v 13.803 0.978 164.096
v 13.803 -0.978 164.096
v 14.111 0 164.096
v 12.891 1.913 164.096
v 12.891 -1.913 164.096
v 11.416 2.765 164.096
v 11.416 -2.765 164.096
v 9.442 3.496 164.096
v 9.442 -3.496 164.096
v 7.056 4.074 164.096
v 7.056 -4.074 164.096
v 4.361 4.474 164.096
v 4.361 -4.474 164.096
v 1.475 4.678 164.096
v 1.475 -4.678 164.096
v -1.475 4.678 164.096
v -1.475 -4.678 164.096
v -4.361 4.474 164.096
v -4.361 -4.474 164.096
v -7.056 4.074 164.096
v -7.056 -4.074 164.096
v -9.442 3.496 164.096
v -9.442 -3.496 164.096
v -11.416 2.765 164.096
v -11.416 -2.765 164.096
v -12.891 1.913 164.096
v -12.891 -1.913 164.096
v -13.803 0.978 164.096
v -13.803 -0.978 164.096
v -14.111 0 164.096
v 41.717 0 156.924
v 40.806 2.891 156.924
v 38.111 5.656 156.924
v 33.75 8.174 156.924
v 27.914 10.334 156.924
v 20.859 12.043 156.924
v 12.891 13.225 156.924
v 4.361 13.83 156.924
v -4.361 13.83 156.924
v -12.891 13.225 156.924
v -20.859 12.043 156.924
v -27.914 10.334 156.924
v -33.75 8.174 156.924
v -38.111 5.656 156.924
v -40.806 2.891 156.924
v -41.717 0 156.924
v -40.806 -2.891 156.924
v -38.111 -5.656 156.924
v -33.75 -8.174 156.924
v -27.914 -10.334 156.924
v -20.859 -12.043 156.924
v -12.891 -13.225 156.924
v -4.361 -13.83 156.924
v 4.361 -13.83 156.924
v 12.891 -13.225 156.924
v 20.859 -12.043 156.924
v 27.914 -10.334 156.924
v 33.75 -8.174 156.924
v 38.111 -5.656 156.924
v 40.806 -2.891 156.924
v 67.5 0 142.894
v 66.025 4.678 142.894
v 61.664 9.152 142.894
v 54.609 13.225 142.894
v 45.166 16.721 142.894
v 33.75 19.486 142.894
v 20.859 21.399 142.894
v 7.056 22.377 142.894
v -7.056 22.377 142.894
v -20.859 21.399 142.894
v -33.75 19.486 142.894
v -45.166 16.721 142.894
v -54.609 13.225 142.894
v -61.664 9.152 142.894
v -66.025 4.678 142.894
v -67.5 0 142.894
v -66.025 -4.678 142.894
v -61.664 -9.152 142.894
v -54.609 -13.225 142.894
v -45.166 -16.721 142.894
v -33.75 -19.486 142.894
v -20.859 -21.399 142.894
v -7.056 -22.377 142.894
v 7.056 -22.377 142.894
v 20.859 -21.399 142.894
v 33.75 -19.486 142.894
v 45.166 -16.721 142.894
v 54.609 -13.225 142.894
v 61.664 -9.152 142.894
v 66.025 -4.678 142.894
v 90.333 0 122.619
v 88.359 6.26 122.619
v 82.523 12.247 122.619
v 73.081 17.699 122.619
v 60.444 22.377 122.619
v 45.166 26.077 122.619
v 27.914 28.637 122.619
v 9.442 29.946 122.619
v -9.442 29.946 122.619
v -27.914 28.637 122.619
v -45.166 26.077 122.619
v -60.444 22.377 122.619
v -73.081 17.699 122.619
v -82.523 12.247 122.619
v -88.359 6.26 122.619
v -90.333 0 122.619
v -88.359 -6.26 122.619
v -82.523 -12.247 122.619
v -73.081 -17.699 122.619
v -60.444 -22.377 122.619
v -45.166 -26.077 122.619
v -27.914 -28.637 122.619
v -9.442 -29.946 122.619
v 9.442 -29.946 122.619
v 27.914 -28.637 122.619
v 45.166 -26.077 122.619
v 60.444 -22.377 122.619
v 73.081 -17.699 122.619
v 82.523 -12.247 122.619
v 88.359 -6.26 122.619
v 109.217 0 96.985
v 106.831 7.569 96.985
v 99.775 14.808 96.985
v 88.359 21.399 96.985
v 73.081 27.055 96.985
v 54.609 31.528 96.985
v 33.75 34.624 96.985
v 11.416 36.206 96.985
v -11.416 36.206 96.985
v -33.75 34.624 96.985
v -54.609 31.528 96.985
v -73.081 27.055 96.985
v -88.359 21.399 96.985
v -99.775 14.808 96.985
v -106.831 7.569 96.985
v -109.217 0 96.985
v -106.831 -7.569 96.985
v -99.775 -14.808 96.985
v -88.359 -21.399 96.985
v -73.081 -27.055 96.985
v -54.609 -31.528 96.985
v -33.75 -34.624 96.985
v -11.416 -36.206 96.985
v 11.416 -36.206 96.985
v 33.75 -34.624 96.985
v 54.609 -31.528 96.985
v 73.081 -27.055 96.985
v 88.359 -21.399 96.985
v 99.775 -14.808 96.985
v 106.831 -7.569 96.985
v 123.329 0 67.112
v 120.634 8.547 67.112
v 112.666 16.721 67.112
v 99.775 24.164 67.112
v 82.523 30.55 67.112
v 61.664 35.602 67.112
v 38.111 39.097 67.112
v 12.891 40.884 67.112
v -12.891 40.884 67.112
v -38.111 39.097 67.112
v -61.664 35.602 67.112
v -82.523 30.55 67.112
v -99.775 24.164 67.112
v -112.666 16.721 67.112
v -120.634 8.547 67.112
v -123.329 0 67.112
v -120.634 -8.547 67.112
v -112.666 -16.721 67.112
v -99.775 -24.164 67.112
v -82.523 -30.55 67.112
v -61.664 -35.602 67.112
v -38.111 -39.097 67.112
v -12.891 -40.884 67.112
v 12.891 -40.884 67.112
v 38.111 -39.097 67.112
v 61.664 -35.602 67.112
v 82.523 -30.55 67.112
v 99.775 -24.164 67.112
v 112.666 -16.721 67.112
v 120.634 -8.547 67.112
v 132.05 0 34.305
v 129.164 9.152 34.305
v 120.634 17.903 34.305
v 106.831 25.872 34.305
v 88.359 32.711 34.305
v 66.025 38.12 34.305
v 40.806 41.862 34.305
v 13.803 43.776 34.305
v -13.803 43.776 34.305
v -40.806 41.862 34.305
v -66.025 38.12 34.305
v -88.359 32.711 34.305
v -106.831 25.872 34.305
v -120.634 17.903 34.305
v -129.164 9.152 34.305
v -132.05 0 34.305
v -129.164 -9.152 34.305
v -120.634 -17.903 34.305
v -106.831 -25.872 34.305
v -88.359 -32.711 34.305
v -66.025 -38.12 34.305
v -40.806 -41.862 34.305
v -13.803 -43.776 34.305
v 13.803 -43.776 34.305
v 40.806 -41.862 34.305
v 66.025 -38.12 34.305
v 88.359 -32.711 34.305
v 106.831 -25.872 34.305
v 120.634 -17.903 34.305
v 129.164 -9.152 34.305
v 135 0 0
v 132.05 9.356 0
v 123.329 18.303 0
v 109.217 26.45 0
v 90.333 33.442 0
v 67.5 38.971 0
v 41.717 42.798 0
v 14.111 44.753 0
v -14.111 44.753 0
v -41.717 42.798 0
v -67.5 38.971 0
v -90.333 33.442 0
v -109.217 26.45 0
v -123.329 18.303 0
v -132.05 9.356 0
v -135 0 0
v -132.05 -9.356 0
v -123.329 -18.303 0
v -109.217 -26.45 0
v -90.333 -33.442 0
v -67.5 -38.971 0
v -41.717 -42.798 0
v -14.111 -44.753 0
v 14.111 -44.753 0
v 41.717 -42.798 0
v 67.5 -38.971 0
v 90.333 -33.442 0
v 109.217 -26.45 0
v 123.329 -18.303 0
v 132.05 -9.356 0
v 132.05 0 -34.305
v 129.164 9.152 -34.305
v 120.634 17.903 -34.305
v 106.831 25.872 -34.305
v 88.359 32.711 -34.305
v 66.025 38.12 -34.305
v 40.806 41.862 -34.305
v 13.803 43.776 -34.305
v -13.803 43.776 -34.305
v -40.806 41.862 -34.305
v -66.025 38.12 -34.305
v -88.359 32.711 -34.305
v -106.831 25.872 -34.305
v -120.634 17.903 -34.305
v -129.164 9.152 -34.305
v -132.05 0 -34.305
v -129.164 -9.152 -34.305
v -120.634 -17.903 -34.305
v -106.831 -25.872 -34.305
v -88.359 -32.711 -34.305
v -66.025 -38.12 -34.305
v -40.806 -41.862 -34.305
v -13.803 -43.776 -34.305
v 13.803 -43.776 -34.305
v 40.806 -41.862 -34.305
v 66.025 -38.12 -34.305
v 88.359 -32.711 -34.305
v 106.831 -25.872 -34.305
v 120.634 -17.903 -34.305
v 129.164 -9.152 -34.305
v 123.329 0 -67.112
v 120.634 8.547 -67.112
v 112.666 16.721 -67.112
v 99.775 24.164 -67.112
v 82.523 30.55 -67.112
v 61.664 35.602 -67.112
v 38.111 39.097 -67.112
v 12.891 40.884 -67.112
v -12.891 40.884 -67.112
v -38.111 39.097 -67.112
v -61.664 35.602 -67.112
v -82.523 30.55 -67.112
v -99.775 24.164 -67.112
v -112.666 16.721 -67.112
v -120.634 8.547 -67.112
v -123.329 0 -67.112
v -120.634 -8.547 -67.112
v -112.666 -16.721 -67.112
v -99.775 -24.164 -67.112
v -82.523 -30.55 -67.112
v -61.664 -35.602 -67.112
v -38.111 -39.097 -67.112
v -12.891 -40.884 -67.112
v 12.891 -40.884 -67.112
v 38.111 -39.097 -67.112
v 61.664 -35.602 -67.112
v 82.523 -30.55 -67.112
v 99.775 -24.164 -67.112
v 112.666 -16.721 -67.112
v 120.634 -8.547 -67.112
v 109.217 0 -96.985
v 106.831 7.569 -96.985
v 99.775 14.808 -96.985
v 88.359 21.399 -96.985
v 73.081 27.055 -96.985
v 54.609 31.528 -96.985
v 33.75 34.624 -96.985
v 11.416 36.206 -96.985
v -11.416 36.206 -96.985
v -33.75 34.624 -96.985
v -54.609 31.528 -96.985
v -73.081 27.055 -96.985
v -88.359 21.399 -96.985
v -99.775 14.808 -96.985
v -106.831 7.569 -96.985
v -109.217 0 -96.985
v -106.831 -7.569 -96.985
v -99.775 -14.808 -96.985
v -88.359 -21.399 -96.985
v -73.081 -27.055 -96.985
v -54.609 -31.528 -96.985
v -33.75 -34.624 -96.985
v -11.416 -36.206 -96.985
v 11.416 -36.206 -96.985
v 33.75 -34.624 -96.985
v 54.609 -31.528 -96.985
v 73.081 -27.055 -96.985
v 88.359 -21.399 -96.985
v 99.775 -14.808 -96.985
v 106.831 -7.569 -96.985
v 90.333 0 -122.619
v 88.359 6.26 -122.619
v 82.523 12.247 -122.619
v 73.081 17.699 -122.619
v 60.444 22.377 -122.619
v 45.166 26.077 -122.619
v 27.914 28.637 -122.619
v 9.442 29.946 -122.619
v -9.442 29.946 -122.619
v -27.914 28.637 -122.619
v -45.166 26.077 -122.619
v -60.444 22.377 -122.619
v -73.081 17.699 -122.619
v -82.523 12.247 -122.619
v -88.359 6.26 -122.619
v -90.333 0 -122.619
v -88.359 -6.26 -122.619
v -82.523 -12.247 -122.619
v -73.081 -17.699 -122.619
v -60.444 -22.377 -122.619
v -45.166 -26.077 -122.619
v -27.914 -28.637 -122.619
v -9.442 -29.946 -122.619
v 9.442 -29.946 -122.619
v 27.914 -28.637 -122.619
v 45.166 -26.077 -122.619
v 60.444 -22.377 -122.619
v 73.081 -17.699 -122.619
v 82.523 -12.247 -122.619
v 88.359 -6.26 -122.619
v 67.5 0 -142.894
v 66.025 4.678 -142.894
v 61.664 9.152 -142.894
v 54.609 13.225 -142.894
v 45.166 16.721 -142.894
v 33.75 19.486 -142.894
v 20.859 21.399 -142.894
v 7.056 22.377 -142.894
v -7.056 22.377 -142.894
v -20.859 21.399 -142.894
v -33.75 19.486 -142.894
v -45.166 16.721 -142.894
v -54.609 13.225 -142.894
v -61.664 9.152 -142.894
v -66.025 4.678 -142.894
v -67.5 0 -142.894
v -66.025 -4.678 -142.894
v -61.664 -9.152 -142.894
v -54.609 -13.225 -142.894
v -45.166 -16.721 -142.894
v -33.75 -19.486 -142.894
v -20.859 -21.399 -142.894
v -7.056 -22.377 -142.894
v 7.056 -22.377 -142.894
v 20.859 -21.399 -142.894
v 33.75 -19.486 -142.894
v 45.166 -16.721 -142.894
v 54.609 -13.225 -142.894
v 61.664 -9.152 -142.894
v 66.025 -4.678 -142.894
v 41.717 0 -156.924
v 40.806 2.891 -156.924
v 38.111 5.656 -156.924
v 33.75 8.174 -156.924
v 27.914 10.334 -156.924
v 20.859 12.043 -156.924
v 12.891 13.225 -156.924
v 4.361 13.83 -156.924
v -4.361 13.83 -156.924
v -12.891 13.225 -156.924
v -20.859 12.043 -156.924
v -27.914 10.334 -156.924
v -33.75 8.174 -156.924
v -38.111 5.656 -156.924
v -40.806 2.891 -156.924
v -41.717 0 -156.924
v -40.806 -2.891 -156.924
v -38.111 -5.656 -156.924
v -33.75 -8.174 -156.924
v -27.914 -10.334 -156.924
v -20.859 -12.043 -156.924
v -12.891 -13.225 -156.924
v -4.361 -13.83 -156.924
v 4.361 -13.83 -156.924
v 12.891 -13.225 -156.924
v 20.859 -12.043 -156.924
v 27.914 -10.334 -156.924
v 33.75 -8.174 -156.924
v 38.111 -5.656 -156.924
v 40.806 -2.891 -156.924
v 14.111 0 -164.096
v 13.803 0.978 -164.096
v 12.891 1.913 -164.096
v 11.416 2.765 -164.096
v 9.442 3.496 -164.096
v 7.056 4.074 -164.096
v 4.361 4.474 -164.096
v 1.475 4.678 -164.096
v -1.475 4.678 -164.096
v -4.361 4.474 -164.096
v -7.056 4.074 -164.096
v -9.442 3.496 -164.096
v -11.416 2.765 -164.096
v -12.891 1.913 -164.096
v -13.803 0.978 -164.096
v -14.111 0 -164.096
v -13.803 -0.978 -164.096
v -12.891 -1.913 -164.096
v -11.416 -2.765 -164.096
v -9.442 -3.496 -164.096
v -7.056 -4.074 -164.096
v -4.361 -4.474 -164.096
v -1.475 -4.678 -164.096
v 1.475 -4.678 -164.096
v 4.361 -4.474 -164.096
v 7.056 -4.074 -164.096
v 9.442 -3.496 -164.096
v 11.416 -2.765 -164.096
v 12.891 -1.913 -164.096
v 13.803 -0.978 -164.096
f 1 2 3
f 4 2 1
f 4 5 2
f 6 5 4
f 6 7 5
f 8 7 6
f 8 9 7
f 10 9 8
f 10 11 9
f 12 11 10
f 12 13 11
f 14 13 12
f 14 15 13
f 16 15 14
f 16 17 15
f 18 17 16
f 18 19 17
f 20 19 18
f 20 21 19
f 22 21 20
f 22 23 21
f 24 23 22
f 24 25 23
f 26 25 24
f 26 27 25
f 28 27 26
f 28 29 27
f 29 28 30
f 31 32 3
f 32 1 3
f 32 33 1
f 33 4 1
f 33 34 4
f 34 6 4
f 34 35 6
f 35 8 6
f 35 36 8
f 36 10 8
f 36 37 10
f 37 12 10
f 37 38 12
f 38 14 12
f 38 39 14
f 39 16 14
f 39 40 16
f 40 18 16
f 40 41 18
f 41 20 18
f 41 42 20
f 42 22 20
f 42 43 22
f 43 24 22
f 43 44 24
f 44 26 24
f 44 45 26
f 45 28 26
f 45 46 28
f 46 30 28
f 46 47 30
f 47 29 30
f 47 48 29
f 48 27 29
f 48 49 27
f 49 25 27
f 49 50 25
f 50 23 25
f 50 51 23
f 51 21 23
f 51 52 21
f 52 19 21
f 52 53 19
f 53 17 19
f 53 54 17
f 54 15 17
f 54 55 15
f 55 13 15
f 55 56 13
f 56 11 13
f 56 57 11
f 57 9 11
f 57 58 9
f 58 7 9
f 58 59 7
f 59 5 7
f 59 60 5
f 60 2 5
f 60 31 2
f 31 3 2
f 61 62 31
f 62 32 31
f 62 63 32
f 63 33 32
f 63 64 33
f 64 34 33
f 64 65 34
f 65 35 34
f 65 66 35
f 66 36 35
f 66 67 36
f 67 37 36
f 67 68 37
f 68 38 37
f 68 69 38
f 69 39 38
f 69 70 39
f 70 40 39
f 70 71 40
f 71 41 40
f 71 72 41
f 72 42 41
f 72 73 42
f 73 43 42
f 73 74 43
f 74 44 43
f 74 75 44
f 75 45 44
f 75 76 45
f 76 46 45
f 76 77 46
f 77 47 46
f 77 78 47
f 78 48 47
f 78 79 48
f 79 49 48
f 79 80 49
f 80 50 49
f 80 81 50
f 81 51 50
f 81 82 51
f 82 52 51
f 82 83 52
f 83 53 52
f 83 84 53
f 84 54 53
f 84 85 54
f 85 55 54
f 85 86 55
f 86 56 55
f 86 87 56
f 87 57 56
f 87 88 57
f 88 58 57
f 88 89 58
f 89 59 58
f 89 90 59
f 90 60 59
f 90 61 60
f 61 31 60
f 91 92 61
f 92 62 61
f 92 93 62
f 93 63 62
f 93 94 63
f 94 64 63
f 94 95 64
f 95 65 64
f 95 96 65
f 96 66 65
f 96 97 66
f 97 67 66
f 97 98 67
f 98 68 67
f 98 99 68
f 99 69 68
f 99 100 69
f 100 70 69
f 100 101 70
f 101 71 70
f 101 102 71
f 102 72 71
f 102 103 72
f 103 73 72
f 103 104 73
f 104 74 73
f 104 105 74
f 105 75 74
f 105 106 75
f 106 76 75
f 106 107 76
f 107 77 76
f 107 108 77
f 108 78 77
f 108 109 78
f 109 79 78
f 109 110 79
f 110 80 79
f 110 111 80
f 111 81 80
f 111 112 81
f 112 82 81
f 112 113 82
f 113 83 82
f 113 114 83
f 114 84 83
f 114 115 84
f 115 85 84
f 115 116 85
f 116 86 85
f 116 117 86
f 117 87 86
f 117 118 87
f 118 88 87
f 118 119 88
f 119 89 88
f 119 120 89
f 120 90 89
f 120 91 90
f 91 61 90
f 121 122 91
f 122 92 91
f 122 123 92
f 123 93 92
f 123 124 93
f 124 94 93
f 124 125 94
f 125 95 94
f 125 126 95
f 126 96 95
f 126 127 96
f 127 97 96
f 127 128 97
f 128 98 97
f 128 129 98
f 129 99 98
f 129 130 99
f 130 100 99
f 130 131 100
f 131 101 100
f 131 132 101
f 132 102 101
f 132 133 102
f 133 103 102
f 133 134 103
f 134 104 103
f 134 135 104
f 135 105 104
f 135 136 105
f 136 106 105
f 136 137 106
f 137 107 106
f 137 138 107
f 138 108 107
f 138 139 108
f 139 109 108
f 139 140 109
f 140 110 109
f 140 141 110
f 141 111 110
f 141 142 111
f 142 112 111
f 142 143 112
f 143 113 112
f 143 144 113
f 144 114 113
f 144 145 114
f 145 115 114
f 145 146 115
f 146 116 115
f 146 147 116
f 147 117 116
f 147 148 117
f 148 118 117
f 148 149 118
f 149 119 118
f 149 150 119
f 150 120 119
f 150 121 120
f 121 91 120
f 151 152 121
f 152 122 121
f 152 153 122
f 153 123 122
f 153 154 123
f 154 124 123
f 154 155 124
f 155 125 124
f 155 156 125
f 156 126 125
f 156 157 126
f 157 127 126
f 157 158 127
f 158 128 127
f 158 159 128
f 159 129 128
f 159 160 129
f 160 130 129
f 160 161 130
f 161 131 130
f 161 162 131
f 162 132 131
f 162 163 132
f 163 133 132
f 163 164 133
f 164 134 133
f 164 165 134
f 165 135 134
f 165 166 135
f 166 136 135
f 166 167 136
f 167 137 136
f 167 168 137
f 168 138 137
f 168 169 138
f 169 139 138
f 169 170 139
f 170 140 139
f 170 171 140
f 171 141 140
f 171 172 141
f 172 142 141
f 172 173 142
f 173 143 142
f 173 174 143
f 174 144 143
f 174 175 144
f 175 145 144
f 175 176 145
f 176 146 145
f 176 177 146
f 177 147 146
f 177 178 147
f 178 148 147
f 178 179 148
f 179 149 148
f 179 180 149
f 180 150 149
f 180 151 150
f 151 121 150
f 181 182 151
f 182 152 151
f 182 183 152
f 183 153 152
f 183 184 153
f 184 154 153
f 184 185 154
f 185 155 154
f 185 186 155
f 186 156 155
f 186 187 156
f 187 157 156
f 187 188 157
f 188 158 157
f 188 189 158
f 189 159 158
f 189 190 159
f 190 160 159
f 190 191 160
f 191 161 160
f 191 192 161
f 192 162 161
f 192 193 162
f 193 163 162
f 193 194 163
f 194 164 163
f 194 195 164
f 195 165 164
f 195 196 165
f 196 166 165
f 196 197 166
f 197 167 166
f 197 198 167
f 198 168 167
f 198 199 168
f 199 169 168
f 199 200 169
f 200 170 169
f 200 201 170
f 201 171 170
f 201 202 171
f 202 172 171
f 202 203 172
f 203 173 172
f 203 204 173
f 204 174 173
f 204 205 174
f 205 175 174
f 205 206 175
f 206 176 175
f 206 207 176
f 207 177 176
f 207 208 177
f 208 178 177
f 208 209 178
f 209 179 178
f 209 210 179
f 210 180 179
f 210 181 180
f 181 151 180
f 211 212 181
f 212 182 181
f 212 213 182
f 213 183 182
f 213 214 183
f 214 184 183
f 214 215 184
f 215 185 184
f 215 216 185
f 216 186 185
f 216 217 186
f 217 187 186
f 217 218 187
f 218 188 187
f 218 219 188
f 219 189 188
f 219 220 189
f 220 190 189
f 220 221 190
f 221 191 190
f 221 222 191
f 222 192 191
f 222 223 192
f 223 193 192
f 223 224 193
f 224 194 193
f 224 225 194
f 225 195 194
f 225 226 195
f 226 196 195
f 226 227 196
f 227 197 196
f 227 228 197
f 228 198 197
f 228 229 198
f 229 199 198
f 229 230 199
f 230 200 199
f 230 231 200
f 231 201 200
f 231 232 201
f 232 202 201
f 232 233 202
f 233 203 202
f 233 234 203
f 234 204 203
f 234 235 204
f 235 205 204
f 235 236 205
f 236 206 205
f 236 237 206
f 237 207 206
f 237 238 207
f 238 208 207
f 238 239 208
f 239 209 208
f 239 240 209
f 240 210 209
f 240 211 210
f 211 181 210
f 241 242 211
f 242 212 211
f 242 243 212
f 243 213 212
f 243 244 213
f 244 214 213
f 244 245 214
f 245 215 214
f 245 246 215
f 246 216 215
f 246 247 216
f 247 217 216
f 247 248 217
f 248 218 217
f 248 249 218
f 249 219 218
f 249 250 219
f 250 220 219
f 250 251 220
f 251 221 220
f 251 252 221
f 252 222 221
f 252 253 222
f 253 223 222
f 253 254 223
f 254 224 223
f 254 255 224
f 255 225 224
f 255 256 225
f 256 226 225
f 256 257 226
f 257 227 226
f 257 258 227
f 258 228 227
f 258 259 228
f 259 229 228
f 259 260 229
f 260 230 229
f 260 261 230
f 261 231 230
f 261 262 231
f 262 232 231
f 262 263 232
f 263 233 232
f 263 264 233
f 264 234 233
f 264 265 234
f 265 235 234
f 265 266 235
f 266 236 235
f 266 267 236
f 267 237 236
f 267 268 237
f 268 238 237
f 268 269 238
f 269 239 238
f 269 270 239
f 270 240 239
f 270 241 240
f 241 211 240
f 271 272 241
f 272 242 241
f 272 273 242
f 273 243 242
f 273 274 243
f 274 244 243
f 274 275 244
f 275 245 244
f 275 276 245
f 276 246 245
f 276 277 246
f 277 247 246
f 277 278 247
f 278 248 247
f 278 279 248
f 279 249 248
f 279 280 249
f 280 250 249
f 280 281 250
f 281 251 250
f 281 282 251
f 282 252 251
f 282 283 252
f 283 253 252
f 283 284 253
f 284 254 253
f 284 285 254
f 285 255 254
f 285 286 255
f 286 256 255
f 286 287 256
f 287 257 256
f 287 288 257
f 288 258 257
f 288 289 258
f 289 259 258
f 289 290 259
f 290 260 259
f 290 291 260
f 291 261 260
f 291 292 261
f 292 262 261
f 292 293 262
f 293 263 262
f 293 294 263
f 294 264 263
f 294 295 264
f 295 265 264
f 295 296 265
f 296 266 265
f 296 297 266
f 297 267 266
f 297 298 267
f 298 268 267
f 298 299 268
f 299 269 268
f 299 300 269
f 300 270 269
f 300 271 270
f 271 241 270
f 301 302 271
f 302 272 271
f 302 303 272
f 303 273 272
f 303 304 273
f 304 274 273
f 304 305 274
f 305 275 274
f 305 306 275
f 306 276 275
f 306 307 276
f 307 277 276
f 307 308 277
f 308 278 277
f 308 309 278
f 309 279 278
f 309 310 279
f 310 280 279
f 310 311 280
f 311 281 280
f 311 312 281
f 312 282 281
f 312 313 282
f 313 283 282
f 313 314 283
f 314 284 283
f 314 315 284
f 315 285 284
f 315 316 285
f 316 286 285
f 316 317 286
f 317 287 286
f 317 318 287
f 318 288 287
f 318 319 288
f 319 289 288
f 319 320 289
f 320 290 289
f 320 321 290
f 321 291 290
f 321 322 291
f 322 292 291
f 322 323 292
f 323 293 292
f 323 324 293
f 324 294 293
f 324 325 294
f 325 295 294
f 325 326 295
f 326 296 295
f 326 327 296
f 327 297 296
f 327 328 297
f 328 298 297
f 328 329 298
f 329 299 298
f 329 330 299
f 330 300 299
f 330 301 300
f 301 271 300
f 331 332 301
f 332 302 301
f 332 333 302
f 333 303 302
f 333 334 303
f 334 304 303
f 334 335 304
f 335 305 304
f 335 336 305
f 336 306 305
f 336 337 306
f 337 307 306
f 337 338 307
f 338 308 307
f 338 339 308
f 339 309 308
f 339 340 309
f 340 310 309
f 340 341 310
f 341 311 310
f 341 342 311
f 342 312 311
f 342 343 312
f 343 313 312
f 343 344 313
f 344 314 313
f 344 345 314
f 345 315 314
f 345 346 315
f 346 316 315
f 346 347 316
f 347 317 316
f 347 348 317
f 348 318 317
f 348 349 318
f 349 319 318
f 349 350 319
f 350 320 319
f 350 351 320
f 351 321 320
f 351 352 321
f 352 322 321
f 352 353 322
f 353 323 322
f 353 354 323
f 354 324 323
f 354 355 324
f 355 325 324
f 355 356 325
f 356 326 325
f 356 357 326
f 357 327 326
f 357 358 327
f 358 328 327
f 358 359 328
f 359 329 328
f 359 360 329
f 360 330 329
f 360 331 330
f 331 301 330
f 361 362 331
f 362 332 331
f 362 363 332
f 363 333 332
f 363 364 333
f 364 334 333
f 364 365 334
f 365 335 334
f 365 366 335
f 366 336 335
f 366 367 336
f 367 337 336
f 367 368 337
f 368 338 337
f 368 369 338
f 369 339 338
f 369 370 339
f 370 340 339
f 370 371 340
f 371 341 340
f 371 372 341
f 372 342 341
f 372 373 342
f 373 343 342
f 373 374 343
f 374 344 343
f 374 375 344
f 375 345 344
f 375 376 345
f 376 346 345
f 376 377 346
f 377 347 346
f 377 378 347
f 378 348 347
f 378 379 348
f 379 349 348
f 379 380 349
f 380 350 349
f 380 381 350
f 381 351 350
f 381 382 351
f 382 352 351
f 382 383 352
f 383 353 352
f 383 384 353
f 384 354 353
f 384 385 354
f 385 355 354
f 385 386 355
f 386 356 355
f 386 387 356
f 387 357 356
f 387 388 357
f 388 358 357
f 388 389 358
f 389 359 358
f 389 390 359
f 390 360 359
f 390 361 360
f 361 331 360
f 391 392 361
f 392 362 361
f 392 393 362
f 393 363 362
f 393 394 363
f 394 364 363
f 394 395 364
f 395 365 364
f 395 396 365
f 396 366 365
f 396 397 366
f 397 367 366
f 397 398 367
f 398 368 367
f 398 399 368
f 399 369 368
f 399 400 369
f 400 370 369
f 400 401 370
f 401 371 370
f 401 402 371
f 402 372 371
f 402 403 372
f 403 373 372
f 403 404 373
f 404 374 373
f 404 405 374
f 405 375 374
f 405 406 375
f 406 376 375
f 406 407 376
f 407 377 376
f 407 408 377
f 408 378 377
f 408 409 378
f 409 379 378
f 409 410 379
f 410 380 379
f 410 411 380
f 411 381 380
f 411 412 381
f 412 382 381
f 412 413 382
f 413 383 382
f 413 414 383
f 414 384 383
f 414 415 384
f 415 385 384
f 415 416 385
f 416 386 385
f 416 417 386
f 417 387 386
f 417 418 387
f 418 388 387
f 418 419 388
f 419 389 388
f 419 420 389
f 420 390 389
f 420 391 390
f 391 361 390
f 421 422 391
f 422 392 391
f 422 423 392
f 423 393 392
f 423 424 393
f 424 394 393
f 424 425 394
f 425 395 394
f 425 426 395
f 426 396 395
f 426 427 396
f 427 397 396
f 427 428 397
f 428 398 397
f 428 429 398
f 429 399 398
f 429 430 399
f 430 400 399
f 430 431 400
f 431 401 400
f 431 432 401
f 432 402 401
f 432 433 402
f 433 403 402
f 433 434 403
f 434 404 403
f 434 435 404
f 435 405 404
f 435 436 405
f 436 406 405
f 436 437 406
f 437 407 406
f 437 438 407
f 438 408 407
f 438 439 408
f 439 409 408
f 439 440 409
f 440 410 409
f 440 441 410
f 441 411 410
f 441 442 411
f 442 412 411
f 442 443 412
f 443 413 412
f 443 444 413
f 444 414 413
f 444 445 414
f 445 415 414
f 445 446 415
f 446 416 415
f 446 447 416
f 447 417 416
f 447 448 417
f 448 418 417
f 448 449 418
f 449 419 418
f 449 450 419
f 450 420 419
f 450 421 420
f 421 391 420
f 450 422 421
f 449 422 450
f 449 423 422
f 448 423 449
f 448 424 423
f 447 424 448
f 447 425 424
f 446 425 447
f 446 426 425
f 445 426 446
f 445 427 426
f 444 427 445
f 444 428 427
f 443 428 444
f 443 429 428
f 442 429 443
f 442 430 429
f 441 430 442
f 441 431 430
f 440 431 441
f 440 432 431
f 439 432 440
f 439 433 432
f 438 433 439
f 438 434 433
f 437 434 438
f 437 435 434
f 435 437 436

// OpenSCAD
// Generated by SolidPython 1.0.1 on 2020-07-29 00:46:48


scale(v = [9, 3, 11]) {
	sphere(r = 15);
}
/***********************************************
*********      SolidPython code:      **********
************************************************
 
# import packages: SolidPython
from solid import *
from solid.utils import *
from itertools import chain, combinations, permutations


class Resize:

    def __init__(self, scad_file):
        self.scad_file = scad_file
        #self.scad_file = import_scad(scad_file)
        # cone/cylinder param:
        self.r1 = 0
        self.r2 = 0
        self.h = 0
        # rectangular prism param:
        self.w = 0
        self.l = 0
        # ellipse param:
        self.r = 0

    # import OpenScad code (file name corresponds to shape)


    # classify shape + parameters
    def assign(self, param1, param2, param3):
        if self.scad_file == 'cone.scad':
            self.r1 = param1
            self.r2 = param2
            self.h = param3
        elif self.scad_file == 'cylinder.scad':
            self.r1 = param1
            self.r2 = param2
            self.h = param3
        elif self.scad_file == 'rectangularPrism.scad':
            self.h = param1
            self.l = param2
            self.w = param3
        else:
            self.r = param1
            self.h = param2

    # resize parameters
    def iterate(self):
        x = range(3, 20, 2)
        i = 1
        if self.scad_file == 'cone.scad':
            tempList = list(permutations(x, 2))
            for temp in tempList:
                param1 = temp[0]
                param2 = temp[1]
                filepath = 'produced_scad_files/' + 'cone' + str(param1) + '_' + str(param2) + '_' + '.scad'
                scad_render_to_file(cylinder(h=param1, r1=param2, r2=0), filepath)

        elif self.scad_file == 'cylinder.scad':
            tempList = list(permutations(x, 3))
            for temp in tempList:
                param1 = temp[0]
                param2 = temp[1]
                filepath = 'produced_scad_files/' + 'cylinder' + str(param1) + '_' + str(param2) + '_' + '.scad'
                scad_render_to_file(cylinder(h=param1, r1=param2, r2=param2), filepath)

        elif self.scad_file == 'rectangularPrism.scad':
            tempList = list(permutations(x, 3))
            for temp in tempList:
                param1 = temp[0]
                param2 = temp[1]
                param3 = temp[2]
                filepath = 'produced_scad_files/' + 'rectangularPrism' + str(param1) + '_' + str(param2) + '_' + str(
                    param3) + '.scad'
                scad_render_to_file(cube(size=(param1, param2, param3)), filepath)

        elif self.scad_file == 'ellipse.scad':
            tempList = list(permutations(x, 4))
            for temp in tempList:
                param1 = temp[0]
                param2 = temp[1]
                param3 = temp[2]
                param4 = temp[3]
                filepath = 'produced_scad_files/' + 'ellipse' + str(param1) + '_' + str(param2) + '_' + str(param3) + '_' + str(param4) + '.scad'
                scad_render_to_file(scale([param1, param2, param3])(sphere(r=param4)), filepath)

    def render_to_scadfile(self):
        scad_render_to_file(scad, 'example.scad') 
 
************************************************/
